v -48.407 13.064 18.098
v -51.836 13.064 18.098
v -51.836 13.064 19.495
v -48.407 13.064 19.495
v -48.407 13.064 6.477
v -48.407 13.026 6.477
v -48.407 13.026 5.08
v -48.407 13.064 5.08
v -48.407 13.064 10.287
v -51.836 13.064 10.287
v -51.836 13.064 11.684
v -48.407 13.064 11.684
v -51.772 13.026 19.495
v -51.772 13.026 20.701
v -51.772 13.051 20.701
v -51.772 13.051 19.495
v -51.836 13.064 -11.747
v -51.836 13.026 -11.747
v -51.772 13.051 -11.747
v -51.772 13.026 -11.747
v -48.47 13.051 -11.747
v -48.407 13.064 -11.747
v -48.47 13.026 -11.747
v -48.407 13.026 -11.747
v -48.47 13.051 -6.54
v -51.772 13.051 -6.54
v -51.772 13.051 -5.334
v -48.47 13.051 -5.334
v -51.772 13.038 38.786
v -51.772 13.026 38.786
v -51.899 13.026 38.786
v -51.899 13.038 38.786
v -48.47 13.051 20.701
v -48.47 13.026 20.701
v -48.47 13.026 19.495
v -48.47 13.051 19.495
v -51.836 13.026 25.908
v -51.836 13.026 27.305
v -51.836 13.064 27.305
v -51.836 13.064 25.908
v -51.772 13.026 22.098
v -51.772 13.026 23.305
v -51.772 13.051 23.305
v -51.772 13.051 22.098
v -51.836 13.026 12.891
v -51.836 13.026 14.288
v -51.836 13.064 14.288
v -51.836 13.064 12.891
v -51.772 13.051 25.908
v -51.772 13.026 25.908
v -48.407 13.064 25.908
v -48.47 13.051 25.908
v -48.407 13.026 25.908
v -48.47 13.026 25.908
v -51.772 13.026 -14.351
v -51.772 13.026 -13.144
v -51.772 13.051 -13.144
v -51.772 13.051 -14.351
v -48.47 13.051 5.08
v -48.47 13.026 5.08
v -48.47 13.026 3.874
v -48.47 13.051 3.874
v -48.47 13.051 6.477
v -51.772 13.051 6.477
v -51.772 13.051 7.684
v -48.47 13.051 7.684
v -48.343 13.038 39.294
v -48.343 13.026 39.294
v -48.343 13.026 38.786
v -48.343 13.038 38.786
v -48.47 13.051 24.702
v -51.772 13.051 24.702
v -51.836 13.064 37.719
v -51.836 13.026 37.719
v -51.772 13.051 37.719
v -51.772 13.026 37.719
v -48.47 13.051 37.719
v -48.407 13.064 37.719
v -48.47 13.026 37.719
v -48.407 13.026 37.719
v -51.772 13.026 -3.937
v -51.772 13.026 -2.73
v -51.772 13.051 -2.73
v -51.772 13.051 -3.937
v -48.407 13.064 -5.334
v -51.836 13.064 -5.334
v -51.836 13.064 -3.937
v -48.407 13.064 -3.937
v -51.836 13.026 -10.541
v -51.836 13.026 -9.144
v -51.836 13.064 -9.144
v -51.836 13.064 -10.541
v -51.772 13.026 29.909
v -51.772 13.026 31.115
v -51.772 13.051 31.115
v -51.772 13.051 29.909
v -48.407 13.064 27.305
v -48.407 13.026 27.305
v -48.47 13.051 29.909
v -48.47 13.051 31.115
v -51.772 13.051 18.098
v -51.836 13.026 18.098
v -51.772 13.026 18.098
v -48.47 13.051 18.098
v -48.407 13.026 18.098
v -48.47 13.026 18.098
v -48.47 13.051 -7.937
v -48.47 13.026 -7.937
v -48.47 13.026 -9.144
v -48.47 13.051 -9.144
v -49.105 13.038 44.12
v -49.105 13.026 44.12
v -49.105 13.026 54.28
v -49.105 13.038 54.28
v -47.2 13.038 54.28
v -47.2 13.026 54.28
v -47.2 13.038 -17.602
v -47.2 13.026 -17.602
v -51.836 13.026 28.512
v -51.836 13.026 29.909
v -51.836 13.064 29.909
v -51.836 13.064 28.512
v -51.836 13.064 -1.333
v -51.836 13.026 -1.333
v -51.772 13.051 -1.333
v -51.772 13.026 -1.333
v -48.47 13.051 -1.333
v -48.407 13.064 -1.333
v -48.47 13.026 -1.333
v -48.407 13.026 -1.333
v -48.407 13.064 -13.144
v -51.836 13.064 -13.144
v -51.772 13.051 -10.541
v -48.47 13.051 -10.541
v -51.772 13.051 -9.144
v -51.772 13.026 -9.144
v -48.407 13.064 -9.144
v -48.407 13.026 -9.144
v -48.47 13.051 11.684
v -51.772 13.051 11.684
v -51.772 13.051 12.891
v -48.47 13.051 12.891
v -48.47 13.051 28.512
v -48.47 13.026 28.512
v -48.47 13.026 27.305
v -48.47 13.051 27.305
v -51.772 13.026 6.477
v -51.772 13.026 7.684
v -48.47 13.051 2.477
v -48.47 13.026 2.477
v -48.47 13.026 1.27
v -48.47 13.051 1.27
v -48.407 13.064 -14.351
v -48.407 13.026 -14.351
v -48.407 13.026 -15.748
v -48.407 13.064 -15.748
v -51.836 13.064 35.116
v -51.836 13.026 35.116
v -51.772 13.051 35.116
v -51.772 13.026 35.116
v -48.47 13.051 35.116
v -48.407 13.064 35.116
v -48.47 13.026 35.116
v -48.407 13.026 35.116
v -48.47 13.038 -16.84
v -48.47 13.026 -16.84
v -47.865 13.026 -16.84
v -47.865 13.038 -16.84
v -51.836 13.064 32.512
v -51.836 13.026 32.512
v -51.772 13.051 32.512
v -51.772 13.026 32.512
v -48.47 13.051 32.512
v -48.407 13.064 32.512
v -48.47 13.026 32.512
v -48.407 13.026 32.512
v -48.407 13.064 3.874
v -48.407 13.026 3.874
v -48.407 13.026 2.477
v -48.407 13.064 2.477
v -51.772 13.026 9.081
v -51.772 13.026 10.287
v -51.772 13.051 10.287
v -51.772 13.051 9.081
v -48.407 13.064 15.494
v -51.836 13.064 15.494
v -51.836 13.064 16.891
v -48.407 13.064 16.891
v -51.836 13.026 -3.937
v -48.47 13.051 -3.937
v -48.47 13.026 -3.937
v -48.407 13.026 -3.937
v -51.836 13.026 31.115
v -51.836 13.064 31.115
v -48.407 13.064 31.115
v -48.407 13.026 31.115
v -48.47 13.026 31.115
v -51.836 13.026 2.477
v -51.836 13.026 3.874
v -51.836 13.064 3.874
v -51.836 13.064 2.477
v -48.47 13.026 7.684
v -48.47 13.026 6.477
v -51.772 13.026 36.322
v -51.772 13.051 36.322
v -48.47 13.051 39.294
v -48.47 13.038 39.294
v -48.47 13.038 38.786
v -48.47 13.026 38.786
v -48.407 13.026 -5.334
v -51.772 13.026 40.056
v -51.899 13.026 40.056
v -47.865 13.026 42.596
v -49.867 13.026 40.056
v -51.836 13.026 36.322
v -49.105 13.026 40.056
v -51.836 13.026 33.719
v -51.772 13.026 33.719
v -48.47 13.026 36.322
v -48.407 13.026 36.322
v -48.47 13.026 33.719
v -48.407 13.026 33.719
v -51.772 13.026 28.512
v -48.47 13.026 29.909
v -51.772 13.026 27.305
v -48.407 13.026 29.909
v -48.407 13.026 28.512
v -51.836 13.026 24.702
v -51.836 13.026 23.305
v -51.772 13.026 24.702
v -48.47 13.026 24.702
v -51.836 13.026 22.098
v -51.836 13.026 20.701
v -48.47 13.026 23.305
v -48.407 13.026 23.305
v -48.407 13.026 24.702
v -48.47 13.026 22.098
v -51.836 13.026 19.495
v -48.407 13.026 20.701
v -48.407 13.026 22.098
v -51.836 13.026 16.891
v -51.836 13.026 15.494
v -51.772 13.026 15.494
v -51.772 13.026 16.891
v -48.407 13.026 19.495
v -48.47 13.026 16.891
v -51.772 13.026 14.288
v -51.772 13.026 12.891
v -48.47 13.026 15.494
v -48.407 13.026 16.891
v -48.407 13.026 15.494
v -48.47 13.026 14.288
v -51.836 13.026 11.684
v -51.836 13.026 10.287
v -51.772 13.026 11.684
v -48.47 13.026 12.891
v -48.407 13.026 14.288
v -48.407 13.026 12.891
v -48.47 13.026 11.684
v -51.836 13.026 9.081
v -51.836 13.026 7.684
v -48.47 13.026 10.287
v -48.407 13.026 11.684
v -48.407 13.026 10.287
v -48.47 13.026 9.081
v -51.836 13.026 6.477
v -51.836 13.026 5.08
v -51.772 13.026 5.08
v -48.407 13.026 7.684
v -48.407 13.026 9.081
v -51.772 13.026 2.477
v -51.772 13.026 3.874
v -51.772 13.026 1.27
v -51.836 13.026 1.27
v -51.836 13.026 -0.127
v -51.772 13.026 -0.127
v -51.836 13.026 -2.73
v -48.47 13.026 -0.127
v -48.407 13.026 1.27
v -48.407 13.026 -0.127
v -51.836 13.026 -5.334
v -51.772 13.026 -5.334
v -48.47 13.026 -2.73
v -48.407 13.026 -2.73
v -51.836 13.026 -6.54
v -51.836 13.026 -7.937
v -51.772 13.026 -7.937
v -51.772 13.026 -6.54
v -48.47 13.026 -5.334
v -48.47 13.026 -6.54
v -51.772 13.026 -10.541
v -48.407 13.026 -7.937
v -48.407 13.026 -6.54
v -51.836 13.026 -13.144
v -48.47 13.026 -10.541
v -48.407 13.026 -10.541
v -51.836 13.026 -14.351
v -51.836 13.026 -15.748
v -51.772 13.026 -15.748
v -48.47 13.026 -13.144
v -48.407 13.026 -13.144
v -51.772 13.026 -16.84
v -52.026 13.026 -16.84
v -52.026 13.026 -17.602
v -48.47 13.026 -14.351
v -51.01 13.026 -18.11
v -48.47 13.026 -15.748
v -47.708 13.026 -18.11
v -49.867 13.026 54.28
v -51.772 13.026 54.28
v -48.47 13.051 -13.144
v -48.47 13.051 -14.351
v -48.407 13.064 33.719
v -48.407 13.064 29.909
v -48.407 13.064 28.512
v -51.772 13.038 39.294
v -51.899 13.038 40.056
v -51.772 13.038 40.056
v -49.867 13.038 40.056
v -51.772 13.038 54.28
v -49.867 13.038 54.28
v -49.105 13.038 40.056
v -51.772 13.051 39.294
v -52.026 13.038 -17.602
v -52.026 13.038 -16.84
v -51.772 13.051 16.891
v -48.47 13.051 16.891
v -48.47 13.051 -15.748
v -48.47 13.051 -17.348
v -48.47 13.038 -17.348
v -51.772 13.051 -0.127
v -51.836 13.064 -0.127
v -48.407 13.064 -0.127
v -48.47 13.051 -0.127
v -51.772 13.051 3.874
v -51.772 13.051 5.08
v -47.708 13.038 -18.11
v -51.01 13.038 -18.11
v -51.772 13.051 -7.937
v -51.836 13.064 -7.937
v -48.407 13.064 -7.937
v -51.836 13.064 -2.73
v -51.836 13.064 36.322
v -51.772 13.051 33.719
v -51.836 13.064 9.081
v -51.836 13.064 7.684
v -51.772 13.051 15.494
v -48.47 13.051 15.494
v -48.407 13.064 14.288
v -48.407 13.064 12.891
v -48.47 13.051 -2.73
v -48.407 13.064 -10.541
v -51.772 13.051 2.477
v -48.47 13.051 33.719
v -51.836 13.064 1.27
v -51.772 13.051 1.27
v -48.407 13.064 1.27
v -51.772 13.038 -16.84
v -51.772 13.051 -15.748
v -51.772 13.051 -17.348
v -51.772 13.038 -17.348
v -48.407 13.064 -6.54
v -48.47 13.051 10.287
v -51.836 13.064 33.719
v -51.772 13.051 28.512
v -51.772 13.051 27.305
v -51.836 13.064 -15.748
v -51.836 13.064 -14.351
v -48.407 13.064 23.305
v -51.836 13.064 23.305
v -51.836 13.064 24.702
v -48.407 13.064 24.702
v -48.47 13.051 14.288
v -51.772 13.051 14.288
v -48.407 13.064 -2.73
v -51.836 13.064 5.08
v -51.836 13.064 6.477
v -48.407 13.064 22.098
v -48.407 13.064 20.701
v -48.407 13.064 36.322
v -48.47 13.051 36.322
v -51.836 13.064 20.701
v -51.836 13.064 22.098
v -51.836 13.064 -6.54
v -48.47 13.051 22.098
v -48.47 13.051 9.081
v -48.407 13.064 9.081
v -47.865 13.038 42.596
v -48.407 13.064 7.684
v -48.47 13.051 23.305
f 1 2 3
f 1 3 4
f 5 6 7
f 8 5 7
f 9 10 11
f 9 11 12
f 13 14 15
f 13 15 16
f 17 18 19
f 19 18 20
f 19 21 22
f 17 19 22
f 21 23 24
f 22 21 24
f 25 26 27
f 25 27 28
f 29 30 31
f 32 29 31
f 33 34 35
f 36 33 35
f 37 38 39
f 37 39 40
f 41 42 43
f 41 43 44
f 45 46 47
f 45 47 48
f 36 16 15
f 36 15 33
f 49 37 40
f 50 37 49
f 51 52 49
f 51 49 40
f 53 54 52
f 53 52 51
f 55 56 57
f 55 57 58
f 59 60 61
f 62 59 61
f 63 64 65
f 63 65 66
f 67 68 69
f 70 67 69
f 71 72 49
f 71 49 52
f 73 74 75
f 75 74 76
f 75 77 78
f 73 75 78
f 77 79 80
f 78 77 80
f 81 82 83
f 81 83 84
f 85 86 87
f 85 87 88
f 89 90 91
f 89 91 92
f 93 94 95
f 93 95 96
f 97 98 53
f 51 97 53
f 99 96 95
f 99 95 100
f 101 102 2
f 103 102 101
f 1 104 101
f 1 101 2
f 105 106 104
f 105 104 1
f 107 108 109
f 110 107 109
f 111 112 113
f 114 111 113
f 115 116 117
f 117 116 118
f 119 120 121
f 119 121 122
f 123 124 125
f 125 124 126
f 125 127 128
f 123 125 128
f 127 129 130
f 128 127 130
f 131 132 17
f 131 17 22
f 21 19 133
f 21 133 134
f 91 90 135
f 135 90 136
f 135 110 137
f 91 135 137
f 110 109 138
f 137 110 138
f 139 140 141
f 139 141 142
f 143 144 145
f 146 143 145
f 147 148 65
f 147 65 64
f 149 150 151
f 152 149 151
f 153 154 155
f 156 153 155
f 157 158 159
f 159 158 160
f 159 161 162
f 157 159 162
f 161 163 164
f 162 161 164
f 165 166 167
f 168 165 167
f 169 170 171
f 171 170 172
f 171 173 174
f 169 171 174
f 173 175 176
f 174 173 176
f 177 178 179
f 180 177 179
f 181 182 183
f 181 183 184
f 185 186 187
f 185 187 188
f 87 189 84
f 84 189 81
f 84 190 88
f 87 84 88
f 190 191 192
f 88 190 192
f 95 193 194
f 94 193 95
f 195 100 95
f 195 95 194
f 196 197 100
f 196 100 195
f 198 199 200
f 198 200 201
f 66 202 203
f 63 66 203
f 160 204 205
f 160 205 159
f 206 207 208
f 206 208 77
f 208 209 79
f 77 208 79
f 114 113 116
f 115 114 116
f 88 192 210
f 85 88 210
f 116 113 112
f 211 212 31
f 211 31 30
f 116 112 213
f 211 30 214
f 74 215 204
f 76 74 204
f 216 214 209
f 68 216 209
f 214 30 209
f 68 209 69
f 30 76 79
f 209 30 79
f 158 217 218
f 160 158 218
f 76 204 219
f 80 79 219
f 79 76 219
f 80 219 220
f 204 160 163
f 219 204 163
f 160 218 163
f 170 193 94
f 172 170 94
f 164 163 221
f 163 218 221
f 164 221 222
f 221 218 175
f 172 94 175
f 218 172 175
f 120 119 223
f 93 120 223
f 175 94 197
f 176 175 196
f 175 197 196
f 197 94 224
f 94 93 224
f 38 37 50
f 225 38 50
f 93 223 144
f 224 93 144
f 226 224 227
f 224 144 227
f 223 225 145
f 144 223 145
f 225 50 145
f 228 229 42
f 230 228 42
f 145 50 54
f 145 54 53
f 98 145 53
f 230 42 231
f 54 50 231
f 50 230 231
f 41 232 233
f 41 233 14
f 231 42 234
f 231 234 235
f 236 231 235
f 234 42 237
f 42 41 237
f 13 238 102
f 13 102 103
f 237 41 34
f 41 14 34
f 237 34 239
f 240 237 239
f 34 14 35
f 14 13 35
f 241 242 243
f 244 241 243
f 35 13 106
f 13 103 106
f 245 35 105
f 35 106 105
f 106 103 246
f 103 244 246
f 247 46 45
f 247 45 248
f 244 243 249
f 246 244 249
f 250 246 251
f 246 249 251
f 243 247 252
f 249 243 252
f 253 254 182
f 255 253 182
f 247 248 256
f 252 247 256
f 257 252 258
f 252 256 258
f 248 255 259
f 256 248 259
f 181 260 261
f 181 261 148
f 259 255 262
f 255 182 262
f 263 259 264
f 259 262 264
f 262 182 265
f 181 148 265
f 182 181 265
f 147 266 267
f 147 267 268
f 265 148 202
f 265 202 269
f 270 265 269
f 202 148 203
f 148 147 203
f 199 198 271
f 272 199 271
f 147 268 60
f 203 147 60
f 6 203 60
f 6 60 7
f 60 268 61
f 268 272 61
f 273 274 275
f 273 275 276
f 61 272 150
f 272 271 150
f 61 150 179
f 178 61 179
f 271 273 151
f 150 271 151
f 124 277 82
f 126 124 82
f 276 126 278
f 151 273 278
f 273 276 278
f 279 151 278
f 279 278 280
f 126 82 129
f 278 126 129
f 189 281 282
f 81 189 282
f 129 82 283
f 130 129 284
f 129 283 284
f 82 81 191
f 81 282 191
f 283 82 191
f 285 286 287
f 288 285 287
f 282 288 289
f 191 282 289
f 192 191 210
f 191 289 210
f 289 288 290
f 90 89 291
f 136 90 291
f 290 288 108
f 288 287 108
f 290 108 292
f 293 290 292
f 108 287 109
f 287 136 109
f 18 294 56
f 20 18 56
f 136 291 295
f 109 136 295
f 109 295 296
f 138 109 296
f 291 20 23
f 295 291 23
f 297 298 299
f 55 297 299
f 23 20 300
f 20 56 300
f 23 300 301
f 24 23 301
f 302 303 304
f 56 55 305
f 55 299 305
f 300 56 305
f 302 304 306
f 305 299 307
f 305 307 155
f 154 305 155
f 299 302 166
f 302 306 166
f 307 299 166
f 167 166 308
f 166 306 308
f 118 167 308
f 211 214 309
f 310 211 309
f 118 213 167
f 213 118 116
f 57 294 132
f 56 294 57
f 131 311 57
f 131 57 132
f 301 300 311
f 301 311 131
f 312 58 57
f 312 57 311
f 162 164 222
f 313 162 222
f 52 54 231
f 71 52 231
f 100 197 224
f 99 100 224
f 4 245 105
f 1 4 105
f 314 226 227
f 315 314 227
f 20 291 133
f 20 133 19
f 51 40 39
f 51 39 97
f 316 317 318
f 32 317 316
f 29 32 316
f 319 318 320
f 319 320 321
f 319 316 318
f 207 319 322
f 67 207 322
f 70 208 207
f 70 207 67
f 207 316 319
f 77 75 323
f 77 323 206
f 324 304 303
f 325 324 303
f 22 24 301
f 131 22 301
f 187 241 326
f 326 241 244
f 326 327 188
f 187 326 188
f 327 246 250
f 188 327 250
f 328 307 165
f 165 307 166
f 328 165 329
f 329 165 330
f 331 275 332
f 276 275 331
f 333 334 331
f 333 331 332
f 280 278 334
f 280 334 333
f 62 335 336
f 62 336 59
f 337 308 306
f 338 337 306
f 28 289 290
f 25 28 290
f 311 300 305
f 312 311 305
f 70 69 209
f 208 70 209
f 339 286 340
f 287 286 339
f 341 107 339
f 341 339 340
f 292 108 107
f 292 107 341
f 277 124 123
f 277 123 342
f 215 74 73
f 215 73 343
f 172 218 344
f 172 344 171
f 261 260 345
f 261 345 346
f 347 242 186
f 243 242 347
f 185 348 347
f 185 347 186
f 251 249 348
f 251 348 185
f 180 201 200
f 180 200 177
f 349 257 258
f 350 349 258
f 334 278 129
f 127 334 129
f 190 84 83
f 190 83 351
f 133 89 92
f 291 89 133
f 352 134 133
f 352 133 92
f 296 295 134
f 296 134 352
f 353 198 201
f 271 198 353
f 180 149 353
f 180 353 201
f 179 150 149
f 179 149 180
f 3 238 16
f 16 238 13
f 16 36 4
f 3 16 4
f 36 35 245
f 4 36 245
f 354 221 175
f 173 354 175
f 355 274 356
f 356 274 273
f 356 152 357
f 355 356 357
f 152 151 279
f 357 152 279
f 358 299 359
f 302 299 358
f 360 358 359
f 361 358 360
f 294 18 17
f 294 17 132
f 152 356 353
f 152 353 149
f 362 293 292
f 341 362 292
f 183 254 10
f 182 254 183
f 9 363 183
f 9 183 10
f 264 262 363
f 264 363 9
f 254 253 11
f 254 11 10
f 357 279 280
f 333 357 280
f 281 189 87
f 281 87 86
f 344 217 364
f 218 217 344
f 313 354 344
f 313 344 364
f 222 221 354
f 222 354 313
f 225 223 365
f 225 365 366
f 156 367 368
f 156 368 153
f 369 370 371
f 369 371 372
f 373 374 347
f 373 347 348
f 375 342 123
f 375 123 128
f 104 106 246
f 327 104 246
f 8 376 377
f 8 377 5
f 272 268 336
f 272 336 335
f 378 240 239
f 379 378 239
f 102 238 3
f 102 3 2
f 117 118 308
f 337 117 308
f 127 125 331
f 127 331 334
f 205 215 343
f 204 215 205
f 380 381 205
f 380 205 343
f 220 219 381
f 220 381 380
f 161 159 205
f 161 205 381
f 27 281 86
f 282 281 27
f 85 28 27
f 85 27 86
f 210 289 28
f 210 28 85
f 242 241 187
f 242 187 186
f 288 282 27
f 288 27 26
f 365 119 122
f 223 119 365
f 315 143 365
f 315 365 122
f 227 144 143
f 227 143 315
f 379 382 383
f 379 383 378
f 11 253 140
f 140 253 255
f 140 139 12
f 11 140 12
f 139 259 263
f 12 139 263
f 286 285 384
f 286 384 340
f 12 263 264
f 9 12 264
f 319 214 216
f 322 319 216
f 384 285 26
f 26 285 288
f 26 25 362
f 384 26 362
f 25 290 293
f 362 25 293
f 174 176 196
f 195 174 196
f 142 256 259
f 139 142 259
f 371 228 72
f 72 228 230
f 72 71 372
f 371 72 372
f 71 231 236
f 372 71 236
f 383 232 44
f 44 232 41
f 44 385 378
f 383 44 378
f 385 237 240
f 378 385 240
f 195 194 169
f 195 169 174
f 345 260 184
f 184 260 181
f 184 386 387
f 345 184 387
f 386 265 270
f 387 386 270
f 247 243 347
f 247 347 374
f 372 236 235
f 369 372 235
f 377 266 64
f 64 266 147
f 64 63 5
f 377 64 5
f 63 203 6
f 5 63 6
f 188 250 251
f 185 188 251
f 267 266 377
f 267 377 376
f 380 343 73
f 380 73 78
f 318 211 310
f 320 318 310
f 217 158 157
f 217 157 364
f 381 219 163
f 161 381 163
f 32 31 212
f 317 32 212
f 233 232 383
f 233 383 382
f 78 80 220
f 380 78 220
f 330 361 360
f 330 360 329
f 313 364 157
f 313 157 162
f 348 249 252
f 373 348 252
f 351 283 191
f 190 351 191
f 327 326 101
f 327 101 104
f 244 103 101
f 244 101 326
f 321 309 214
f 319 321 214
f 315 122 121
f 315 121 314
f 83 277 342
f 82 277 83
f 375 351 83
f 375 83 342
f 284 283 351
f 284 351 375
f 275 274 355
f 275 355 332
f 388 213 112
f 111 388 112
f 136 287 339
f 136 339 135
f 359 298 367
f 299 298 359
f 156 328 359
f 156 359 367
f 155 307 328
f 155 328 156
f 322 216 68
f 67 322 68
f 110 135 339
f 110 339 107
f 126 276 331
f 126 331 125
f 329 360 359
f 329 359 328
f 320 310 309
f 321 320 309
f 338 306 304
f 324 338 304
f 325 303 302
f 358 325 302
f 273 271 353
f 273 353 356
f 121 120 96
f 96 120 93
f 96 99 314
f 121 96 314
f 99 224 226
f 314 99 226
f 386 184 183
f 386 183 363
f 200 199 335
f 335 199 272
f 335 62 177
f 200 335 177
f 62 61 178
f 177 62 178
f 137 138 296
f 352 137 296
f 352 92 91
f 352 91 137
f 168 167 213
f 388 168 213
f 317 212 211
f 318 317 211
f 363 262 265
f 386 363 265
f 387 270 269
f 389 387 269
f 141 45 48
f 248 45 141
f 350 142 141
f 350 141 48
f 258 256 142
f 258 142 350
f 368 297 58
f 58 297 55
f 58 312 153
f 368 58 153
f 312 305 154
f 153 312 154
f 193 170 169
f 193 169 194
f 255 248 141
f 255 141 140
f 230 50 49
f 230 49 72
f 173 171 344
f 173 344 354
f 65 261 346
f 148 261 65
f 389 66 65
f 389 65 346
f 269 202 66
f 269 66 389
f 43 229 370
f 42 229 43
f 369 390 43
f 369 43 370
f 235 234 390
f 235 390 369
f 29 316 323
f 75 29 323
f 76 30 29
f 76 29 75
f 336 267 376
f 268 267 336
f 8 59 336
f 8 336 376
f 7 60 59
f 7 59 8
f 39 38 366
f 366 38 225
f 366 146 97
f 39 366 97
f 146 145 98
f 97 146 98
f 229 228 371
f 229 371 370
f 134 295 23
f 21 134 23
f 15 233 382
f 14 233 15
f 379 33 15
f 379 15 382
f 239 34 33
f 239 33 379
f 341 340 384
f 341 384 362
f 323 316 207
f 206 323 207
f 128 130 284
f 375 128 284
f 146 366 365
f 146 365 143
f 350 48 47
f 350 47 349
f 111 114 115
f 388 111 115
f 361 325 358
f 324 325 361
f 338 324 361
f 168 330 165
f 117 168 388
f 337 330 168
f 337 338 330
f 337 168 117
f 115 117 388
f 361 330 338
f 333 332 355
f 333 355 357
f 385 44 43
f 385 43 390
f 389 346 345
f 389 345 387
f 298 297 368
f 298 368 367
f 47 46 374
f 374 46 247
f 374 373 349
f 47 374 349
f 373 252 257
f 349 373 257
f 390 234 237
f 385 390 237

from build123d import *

# Parameters (mm, degrees)
BOSS_EXTRUDE1_DEPTH   = 0.0127
BOSS_EXTRUDE1_2_DEPTH = 0.0127
SKETCH2_W             = 3.302
SKETCH2_H             = 56.642
BOSS_EXTRUDE2_DEPTH   = 0.0254
SKETCH3_W             = 3.429
SKETCH3_H             = 1.397
BOSS_EXTRUDE3_DEPTH   = 0.0381
LPATTERN1_COUNT       = 21
LPATTERN1_PITCH       = 2.6035


with BuildPart() as part:
    # Sketch1 → Boss-Extrude1 (new body)
    with BuildSketch(Plane(origin=(0, 13.025569655, 0), x_dir=(1, 0, 0), z_dir=(0, 1, 0))):
        Polygon((-49.105346889, -54.280248144), (-47.200346889, -54.280248144), (-47.200346889, -44.120248144), (-47.200346889, -42.596248144), (-47.200346889, 16.839751856), (-47.200346889, 17.601751856), (-47.708346889, 18.109751856), (-51.010346889, 18.109751856), (-52.026346889, 17.601751856), (-52.026346889, 16.839751856), (-47.864580691, 16.839751856), (-47.864580691, -42.596248144), (-49.105346889, -44.120248144), align=None)
    extrude(amount=BOSS_EXTRUDE1_DEPTH)



with BuildPart() as body_2:
    # Sketch1 → Boss-Extrude1 2 (new body)
    with BuildSketch(Plane(origin=(0, 13.025569655, 0), x_dir=(1, 0, 0), z_dir=(0, 1, 0))):
        Polygon((-49.867346889, -40.056248144), (-49.105346889, -40.056248144), (-48.343346889, -39.294248144), (-48.343346889, -38.786248144), (-51.899346889, -38.786248144), (-51.899346889, -40.056248144), (-51.772346889, -40.056248144), (-51.772346889, -54.280248144), (-49.867346889, -54.280248144), align=None)
    extrude(amount=BOSS_EXTRUDE1_2_DEPTH)


with BuildPart() as part_1:
    add(part.part)

    add(body_2.part)  # Boss-Extrude2 merges body 2
    # Sketch2 → Boss-Extrude2 (add)
    with BuildSketch(Plane(origin=(0, 13.025569655, 0), x_dir=(1, 0, 0), z_dir=(0, 1, 0))):
        with Locations((-50.121346889, -10.973248144)):
            Rectangle(SKETCH2_W, SKETCH2_H)
    extrude(amount=BOSS_EXTRUDE2_DEPTH)

    # Sketch3 → Boss-Extrude3 (add)
    with BuildSketch(Plane(origin=(0, 13.025569655, 0), x_dir=(1, 0, 0), z_dir=(0, 1, 0))):
        with Locations((-50.121346889, -37.020948144)):
            Rectangle(SKETCH3_W, SKETCH3_H)
    boss_extrude3 = extrude(amount=BOSS_EXTRUDE3_DEPTH)

    # LPattern1: Boss-Extrude3 ×21
    with Locations(*[(0, 0, -i * LPATTERN1_PITCH) for i in range(1, LPATTERN1_COUNT)]):
        add(boss_extrude3)


solid = part_1.part
